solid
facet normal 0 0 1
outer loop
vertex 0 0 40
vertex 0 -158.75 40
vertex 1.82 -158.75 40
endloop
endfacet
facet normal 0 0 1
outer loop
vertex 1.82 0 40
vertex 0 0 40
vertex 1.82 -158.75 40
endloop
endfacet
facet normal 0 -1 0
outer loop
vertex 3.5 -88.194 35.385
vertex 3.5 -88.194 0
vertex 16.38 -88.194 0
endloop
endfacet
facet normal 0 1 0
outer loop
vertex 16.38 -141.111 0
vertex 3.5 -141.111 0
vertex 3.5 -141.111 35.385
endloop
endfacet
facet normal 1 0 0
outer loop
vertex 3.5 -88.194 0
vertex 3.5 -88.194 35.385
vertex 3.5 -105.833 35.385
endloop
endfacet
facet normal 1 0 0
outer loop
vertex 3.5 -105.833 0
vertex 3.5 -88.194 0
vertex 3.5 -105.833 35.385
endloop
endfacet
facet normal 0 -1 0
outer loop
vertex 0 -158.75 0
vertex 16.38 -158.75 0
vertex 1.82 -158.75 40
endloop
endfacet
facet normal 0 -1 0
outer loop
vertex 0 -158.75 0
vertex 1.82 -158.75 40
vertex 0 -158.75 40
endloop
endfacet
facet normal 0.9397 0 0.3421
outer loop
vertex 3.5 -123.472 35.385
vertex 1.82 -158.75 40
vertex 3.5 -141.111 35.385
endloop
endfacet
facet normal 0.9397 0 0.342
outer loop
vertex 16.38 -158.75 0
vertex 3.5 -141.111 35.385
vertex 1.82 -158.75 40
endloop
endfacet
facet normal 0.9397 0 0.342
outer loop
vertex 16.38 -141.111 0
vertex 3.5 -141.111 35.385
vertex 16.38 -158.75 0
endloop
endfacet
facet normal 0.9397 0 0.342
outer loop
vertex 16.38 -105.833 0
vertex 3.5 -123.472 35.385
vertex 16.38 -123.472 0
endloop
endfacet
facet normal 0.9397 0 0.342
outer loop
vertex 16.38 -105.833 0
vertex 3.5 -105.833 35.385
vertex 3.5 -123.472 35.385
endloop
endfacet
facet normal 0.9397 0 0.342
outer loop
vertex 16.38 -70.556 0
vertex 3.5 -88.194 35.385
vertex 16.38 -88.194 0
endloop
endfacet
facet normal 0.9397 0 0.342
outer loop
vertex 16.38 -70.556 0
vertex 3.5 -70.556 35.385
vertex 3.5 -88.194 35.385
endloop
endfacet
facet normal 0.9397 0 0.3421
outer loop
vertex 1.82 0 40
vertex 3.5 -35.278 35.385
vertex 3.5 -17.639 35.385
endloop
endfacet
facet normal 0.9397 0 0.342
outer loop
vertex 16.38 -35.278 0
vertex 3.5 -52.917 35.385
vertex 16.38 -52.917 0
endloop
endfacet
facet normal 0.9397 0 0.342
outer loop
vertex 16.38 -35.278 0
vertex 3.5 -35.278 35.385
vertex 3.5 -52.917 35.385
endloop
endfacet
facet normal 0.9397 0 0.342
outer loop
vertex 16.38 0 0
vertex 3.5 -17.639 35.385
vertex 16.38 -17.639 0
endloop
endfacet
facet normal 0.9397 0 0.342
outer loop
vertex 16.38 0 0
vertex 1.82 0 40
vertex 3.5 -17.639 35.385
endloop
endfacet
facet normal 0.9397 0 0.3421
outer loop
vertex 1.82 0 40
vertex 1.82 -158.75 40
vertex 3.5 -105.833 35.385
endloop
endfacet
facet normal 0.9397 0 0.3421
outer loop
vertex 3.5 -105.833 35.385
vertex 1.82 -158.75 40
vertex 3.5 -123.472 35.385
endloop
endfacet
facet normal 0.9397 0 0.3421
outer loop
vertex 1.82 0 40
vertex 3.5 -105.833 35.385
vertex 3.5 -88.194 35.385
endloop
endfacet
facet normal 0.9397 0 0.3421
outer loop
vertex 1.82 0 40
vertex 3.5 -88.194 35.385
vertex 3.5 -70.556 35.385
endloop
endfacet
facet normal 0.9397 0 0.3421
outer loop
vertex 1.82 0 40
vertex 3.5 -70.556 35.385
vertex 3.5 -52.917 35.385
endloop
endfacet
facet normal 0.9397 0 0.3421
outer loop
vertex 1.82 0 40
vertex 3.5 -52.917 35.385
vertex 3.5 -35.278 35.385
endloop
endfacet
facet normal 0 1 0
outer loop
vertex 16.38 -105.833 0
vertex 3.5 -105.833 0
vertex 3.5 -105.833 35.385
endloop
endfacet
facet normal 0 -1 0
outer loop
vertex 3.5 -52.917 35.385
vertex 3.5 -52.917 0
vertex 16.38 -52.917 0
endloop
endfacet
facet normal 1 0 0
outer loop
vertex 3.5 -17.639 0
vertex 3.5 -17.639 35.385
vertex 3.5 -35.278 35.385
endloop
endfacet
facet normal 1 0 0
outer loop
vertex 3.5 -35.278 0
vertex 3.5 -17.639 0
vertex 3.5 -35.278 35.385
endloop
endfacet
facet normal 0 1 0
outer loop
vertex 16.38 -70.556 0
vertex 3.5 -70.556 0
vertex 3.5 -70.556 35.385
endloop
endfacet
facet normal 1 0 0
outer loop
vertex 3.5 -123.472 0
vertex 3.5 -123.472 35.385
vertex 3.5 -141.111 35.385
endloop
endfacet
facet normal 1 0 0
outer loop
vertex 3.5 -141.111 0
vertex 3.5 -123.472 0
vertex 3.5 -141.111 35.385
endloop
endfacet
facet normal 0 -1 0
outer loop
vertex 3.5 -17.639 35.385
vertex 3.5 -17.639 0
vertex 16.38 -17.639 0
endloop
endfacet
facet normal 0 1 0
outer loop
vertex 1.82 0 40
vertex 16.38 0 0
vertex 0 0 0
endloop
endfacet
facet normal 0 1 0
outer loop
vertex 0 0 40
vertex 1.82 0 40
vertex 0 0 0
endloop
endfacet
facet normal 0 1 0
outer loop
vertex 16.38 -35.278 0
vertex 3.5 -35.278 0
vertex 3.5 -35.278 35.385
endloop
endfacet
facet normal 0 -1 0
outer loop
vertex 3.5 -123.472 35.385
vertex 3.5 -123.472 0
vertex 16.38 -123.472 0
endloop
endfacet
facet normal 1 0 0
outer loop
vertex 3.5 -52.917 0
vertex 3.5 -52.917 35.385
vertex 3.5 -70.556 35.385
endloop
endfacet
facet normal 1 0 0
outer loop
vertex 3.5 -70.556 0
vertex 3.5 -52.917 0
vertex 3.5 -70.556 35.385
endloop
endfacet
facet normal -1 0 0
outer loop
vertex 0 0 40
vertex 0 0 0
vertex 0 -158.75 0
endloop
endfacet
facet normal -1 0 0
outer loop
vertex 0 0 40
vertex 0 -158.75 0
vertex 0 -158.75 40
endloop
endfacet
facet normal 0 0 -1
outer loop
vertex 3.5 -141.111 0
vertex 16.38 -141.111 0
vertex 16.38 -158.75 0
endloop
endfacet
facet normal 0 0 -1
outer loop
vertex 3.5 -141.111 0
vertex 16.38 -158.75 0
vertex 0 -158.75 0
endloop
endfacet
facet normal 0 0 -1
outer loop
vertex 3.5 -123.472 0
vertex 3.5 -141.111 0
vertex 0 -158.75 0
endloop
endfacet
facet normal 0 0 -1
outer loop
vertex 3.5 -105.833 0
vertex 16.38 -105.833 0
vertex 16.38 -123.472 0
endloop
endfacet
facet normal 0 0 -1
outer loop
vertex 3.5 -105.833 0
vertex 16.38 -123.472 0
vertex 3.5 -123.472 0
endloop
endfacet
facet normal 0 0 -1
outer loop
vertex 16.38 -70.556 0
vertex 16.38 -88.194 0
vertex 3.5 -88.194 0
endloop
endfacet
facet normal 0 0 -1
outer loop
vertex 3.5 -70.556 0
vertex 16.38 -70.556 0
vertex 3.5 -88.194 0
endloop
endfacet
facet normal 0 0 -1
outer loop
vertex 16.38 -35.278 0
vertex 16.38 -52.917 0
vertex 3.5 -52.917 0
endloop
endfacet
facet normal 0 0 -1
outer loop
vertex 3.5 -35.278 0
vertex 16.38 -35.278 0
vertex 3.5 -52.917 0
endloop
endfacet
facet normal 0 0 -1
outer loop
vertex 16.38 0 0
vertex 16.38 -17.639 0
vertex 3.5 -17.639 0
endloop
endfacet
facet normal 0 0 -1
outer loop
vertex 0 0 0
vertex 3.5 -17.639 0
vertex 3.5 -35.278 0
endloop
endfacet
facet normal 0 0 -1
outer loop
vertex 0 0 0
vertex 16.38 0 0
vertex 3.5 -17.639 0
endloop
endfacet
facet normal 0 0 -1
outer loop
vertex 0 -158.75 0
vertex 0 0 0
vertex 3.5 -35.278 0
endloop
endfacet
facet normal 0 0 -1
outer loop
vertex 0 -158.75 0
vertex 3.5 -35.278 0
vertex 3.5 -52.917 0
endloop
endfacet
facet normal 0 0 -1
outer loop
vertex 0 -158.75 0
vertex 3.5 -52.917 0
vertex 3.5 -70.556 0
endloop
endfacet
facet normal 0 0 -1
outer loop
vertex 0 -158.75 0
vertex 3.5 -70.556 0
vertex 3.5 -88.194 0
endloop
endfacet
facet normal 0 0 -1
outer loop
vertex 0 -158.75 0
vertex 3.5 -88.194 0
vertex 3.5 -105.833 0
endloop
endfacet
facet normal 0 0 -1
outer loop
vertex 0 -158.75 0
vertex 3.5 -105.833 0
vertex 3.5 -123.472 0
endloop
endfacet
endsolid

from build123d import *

# Parameters (mm, degrees)
PAD018_DEPTH    = 158.75
SKETCH026_W     = 12.88
SKETCH026_H     = 17.638889
POCKET007_DEPTH = 45
SKETCH027_W     = 5
SKETCH027_H     = 5
POCKET008_DEPTH = 200


with BuildPart() as part:
    # Sketch025 → Pad018 (new body)
    with BuildSketch(Plane.XZ):
        Polygon((0, 0), (0, 45), (16.38, 0), align=None)
    extrude(amount=PAD018_DEPTH)

    # Sketch026 (on Face3 of Pad018) → Pocket007 (cut)
    with BuildSketch(Plane(origin=(0, 0, 0), x_dir=(1, 0, 0), z_dir=(0, 0, -1))):
        with Locations((9.94, 26.458333)):
            Rectangle(SKETCH026_W, SKETCH026_H)
        with Locations((9.94, 132.291666)):
            Rectangle(SKETCH026_W, SKETCH026_H)
        with Locations((9.94, 97.013888)):
            Rectangle(SKETCH026_W, SKETCH026_H)
        with Locations((9.94, 61.736111)):
            Rectangle(SKETCH026_W, SKETCH026_H)
    extrude(amount=-POCKET007_DEPTH, mode=Mode.SUBTRACT)

    # Sketch027 (on Face5 of Pocket007) → Pocket008 (cut)
    with BuildSketch(Plane.XZ.offset(158.75)):
        with Locations((2.5, 42.5)):
            Rectangle(SKETCH027_W, SKETCH027_H)
    extrude(amount=-POCKET008_DEPTH, mode=Mode.SUBTRACT)


solid = part.part
